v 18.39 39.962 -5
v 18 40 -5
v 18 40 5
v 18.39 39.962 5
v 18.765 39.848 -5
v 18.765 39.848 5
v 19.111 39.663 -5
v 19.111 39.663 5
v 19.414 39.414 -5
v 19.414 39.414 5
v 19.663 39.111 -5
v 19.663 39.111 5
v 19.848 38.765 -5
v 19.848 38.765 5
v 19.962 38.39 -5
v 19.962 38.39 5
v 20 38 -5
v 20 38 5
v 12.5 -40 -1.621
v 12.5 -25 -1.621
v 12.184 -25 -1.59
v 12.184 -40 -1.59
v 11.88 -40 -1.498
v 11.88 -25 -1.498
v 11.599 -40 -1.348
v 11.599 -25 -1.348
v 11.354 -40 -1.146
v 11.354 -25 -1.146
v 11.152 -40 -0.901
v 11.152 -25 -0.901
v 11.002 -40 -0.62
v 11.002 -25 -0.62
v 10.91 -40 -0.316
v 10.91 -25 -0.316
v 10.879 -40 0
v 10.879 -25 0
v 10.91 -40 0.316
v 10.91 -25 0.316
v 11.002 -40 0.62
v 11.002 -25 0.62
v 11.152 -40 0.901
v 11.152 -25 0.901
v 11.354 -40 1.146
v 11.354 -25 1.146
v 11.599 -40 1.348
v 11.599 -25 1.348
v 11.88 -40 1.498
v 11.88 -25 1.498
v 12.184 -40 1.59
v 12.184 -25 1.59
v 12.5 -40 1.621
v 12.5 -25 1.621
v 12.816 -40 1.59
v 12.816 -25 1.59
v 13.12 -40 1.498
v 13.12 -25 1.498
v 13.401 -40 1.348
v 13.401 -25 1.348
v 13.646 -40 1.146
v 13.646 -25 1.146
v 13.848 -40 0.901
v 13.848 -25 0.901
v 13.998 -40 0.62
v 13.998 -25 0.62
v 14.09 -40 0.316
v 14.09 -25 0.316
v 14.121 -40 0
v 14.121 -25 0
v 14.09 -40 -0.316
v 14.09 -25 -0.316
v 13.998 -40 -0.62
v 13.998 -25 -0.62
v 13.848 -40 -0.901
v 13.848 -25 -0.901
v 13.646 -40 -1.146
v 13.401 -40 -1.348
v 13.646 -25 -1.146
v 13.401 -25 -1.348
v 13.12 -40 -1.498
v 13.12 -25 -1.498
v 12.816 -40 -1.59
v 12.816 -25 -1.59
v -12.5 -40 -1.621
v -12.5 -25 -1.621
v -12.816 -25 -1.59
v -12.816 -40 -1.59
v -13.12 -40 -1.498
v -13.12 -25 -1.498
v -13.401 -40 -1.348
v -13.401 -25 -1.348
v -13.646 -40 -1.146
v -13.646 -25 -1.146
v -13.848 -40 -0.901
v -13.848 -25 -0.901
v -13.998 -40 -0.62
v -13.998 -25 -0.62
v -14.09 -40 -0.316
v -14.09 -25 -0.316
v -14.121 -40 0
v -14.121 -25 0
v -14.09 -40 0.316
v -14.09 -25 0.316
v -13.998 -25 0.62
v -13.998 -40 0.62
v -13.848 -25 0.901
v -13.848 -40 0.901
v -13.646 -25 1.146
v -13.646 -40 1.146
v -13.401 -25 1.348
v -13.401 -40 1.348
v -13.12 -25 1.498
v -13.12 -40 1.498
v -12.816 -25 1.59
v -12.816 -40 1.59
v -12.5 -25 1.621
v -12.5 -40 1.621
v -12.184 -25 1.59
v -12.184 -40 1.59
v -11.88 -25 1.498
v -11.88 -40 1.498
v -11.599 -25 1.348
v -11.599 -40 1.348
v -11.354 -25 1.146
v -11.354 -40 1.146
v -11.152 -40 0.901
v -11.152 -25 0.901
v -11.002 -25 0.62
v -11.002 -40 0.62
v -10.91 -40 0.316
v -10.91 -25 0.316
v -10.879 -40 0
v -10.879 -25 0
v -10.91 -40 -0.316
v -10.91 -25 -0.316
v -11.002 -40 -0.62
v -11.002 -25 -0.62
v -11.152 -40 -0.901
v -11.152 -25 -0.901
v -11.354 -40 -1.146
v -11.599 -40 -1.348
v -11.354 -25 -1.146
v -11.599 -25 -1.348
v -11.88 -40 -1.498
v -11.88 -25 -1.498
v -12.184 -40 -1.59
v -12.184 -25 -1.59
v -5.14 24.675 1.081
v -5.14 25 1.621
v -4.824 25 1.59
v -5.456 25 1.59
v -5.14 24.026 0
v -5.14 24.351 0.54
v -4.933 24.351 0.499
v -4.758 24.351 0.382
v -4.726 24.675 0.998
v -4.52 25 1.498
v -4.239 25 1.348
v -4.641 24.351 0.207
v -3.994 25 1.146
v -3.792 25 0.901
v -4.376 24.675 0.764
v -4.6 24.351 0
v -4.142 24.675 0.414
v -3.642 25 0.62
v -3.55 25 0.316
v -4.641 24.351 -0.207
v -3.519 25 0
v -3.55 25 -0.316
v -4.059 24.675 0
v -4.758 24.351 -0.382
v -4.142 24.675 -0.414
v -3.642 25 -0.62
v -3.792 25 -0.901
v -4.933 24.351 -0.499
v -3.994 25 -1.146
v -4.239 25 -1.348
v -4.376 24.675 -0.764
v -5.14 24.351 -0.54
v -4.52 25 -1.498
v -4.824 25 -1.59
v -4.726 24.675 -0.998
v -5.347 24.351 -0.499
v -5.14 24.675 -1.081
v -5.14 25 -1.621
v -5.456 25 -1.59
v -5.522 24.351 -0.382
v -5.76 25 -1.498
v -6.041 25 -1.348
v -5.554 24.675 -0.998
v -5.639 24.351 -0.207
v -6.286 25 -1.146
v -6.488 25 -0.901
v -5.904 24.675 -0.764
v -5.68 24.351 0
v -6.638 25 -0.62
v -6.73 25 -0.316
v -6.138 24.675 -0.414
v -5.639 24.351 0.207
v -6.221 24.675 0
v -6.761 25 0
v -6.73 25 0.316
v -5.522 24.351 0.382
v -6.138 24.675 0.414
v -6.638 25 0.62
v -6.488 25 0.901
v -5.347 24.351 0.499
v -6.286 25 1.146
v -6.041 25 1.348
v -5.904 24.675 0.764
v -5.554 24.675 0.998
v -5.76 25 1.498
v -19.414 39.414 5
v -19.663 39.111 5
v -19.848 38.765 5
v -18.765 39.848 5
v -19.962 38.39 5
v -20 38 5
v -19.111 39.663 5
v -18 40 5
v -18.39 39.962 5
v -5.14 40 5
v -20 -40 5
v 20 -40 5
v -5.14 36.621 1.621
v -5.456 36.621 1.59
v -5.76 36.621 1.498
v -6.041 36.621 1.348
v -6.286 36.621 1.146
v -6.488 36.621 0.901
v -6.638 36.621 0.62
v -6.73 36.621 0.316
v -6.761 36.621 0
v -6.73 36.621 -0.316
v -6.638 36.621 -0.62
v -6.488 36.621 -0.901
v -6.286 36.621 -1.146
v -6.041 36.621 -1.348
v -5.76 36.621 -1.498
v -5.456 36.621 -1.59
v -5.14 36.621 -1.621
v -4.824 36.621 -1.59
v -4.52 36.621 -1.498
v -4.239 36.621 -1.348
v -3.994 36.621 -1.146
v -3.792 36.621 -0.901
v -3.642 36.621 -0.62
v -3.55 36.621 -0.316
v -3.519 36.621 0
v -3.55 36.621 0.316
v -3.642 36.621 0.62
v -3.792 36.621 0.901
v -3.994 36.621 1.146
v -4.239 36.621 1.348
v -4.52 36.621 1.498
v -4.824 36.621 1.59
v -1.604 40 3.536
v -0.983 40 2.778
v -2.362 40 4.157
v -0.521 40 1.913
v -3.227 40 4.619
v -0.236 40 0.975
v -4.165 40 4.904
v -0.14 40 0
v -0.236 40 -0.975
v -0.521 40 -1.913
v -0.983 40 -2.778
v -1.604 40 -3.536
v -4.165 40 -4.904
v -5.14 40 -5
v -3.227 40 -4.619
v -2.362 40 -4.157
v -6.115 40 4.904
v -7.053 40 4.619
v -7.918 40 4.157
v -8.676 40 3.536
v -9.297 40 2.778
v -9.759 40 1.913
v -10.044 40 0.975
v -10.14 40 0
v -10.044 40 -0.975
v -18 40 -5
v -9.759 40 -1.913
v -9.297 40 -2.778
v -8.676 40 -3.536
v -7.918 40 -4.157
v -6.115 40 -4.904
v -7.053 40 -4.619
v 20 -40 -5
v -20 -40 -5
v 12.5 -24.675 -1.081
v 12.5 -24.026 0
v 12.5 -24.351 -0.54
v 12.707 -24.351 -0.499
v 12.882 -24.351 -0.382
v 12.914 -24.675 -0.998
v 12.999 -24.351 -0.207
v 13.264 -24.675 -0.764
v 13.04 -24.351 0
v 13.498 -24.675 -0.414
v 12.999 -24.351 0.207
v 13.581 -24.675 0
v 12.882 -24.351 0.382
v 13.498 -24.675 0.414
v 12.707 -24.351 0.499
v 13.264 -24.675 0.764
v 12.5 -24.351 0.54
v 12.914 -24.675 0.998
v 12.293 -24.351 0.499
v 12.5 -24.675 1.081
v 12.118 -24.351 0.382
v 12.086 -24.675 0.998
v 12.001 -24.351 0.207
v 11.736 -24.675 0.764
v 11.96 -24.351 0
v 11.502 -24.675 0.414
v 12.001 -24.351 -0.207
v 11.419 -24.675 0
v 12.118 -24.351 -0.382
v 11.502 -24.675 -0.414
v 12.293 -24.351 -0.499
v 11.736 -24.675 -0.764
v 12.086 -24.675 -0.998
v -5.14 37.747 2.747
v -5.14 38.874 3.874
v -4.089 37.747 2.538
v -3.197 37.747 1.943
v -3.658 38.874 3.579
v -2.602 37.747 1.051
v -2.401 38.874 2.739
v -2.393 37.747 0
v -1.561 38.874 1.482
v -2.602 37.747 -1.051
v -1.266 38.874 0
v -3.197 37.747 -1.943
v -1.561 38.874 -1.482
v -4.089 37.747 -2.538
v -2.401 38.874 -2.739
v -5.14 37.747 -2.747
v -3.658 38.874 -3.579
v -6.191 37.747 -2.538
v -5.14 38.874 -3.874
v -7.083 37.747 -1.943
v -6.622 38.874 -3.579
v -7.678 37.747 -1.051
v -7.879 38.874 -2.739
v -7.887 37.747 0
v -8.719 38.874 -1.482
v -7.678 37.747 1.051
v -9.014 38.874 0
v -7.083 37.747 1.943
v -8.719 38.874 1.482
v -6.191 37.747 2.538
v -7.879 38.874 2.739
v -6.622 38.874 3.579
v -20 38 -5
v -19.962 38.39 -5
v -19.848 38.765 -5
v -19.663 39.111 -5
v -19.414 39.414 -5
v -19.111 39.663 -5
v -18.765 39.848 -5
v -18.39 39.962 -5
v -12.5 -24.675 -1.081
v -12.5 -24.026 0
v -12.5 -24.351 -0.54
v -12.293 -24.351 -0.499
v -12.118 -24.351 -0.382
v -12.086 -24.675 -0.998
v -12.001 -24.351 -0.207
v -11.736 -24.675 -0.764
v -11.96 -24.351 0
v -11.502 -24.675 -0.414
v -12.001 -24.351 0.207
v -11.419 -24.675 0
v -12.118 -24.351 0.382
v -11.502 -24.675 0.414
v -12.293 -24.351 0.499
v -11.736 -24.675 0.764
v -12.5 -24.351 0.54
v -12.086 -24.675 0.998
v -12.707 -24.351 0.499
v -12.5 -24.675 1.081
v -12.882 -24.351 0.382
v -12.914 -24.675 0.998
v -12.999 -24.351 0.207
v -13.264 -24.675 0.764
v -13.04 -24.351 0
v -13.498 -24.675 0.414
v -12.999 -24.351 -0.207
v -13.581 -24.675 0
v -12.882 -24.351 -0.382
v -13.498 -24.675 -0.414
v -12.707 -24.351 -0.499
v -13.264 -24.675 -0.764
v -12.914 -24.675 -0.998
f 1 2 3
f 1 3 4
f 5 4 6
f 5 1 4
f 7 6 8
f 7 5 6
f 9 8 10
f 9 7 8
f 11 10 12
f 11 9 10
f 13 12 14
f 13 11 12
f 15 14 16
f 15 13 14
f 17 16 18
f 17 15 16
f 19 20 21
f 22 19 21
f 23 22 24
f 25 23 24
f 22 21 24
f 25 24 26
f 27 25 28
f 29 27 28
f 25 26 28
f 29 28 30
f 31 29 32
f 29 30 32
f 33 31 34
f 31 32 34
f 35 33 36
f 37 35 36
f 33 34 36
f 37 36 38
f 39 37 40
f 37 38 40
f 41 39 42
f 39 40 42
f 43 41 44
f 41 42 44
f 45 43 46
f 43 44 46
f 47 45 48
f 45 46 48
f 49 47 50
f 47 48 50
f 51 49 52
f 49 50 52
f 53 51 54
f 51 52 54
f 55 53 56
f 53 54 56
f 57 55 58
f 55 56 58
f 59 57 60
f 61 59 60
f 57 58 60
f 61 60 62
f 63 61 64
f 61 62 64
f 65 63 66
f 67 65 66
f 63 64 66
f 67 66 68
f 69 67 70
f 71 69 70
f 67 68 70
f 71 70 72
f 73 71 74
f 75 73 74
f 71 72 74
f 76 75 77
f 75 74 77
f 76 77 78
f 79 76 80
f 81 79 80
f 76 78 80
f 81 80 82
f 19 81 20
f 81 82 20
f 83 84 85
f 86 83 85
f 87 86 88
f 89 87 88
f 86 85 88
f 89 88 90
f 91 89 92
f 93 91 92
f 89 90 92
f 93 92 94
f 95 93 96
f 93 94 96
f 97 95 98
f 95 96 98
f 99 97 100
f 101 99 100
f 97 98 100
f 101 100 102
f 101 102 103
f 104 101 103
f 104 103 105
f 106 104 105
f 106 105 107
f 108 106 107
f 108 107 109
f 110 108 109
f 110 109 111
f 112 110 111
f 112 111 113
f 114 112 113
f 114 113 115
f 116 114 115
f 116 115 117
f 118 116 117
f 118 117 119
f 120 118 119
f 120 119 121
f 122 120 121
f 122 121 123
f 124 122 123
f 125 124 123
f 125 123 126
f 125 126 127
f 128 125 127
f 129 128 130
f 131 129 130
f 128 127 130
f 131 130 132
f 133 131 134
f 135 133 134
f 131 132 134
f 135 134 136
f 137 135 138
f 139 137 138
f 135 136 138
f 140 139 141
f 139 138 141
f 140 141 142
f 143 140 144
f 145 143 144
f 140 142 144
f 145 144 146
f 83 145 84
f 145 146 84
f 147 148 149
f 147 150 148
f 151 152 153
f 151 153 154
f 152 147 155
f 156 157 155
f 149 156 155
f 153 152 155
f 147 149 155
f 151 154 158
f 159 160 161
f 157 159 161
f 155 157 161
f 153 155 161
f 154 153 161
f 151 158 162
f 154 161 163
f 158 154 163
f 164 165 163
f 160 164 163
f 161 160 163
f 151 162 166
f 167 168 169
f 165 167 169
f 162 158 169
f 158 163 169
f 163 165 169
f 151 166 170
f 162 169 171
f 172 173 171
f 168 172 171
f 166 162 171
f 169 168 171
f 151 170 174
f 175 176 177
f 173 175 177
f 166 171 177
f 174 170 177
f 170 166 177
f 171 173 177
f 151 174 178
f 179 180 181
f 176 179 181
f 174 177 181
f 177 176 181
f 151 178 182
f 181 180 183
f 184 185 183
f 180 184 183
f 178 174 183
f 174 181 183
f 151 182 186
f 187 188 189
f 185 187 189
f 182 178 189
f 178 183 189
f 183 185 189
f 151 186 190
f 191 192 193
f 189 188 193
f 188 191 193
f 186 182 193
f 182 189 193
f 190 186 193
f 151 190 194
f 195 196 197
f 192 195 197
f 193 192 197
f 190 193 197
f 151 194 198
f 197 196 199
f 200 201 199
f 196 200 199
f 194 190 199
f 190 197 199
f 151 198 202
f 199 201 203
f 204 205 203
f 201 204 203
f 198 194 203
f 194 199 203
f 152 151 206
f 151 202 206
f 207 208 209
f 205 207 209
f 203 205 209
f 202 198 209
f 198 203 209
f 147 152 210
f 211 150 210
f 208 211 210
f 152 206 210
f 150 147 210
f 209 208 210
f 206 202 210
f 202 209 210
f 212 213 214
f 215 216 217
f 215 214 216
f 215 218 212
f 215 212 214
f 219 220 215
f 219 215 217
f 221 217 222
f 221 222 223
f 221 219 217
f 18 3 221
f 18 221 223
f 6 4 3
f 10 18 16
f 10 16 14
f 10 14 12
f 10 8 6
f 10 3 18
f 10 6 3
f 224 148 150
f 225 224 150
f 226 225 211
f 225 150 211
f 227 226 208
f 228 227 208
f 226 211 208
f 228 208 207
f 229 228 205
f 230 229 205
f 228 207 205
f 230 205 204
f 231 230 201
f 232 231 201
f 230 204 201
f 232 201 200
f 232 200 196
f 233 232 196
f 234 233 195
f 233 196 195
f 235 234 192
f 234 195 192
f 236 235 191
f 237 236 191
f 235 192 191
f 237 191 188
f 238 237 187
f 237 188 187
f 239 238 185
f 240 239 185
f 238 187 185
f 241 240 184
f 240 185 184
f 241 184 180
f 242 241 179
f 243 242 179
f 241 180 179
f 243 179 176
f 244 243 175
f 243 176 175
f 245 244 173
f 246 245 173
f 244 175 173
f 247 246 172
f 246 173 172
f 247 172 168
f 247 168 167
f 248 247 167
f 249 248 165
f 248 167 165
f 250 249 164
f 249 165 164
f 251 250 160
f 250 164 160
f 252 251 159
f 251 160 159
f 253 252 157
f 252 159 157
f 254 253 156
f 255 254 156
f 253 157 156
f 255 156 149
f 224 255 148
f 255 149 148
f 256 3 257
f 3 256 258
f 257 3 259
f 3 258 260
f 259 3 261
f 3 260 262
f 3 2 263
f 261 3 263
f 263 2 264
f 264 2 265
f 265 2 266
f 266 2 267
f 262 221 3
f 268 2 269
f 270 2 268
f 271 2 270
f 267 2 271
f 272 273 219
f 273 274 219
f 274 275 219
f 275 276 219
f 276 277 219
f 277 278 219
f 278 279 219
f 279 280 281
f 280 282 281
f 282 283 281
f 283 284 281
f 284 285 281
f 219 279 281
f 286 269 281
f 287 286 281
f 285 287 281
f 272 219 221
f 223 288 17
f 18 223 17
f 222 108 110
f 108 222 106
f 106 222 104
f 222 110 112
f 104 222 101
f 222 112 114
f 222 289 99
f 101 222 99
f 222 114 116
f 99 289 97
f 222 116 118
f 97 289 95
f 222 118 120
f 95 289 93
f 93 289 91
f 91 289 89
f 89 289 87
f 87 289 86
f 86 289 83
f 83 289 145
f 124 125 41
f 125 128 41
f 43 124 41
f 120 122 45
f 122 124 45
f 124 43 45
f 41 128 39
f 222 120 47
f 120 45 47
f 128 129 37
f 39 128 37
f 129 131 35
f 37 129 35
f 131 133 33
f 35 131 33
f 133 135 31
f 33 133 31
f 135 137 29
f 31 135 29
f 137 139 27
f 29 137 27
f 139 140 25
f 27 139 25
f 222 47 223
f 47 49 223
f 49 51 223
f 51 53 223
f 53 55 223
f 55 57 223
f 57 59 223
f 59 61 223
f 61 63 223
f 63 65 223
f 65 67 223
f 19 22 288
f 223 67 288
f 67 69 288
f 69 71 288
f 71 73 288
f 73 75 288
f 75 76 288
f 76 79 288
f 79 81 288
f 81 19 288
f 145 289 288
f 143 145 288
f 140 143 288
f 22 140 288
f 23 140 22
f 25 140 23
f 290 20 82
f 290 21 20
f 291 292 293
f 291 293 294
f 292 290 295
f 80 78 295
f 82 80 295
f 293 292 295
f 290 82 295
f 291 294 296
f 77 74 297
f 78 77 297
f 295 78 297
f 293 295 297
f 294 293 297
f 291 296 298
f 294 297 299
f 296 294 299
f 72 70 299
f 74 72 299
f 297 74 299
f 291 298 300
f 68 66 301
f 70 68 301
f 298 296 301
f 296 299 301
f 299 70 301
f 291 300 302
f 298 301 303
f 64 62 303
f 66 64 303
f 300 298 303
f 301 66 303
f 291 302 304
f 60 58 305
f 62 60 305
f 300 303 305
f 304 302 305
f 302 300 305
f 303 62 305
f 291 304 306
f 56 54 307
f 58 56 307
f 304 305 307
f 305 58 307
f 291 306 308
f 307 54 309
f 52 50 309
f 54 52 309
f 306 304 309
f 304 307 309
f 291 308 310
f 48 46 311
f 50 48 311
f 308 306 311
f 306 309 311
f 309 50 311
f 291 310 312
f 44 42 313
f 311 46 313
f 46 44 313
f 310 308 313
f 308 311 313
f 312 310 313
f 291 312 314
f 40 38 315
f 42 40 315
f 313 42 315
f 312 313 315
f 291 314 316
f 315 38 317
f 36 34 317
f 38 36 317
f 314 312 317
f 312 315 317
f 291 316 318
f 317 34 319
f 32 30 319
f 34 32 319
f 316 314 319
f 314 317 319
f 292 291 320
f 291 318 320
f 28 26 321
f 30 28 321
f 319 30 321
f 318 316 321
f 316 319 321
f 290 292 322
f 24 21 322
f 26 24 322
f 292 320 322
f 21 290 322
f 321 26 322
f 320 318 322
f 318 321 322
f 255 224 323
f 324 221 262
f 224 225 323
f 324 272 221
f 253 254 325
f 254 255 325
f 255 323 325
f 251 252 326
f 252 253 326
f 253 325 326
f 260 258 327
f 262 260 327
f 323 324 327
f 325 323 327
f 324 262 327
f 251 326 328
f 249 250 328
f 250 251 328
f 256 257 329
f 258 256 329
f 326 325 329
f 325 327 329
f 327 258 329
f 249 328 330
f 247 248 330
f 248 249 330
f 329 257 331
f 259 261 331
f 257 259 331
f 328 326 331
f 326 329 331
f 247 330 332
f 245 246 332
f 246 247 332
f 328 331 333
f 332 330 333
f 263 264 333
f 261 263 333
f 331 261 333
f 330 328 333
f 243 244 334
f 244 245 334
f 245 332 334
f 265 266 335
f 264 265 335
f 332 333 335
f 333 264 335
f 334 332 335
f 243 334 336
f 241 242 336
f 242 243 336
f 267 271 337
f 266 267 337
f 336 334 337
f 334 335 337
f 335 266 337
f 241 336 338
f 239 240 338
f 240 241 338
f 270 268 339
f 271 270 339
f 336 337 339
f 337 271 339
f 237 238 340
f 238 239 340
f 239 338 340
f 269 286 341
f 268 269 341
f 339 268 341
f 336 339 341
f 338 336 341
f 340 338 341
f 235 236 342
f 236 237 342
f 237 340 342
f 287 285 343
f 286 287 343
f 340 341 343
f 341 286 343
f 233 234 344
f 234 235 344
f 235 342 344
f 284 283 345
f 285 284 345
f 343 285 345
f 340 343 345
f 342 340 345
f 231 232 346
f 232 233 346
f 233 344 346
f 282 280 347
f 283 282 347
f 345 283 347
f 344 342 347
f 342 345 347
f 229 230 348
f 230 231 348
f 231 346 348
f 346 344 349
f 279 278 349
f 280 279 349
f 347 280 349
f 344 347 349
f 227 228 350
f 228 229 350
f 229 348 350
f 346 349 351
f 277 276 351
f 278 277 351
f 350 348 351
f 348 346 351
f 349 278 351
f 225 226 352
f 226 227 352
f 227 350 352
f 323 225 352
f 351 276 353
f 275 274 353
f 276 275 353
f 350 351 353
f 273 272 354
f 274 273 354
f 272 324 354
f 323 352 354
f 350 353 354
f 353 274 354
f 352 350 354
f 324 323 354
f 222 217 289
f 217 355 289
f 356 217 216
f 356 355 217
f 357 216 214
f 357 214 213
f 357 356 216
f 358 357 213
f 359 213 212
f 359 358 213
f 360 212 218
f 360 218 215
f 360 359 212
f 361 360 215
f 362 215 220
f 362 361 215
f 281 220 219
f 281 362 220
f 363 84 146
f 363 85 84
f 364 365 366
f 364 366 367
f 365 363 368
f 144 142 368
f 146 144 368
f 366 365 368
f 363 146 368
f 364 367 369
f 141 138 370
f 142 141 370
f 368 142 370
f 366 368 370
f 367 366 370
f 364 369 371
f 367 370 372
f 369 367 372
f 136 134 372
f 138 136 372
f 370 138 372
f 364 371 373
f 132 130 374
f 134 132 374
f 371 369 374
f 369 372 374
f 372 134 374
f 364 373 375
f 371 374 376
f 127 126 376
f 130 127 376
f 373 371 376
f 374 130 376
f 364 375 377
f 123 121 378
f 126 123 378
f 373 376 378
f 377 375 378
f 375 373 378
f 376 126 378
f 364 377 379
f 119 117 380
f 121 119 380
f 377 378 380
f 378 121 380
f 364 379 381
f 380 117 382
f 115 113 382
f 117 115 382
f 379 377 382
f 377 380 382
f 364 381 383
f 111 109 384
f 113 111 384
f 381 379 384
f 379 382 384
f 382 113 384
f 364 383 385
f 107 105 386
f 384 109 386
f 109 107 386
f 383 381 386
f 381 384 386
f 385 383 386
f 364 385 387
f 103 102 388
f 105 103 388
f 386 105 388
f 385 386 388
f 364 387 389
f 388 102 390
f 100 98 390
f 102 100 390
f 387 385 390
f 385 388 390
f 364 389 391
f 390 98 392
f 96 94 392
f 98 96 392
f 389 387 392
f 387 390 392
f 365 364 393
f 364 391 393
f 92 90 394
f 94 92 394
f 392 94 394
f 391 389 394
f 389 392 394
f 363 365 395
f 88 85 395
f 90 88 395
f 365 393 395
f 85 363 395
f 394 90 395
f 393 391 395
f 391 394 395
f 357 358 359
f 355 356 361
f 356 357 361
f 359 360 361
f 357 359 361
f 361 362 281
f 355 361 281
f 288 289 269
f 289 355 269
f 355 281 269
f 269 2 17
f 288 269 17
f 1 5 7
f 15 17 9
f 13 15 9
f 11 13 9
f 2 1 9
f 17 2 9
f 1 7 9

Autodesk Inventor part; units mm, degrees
ref_plane "YZ Plane" through (0, 0, 0) normal (1, 0, 0) x (0, 1, 0)
ref_plane "XZ Plane" through (0, 0, 0) normal (0, 1, 0) x (-1, 0, 0)
ref_plane "XY Plane" through (0, 0, 0) normal (0, 0, 1) x (1, 0, 0)
sketch "Esboço1" plane through (0, 0, 0) normal (0, 0, 1) x (1, 0, 0)
  line L0 (-20, -40) -> (20, -40)
  line L1 (20, -40) -> (20, 40)
  line L2 (20, 40) -> (-20, 40)
  line L3 (-20, 40) -> (-20, -40)
  line L4 (-20, 40) -> (20, 40)
  circle A0 centre (0, 30) radius 5 construction
  circle A1 centre (0, 30) radius 28 construction
  circle A2 centre (0, 30) radius 74 construction
  line L5 (-20, 10.4041) -> (20, 10.4041) construction
  line L6 (-20, -44) -> (20, -44) construction
  line L7 (-103.6, 0) -> (103.6, 0) construction
  line L8 (0, -73.6) -> (0, 133.6) construction
  line L9 (-20, 16.906) -> (20, 40)
  point P0 (0, 0)
  dimension "d0" = 80
  dimension "d1" = 40
  dimension "d41" = 10
  dimension "d42" = 70
  dimension "d43" = 56
  dimension "d45" = 84
  dimension "d49" = 30
  dimension "d58" = 10
extrude "Extrusão1" add sketch "Esboço1" along normal mid plane 10
extrude "Extrusão4" [suppressed]
sketch "Esboço2" plane through (-20, -40, -5) normal (0, -1, 0) x (1, 0, 0)
  line L0 (40, 10) -> (40, 0)
  line L1 (40, 5) -> (0, 5) construction
  line L2 (0, 0) -> (0, 10)
  line L3 (0, 0) -> (0, 10) projected
  line L4 (40, 0) -> (40, 10) projected
  line L5 (0, 10) -> (40, 10) construction
  line L6 (20, 10) -> (20, 0) construction
  line L7 (40, 0) -> (0, 0) construction
  point P0 (20, 5)
  point P1 (7.5, 5)
  point P2 (32.5, 5)
  dimension "d9" = 7.5
  dimension "d10" = 7.5
  dimension "d37" = 25
hole "Furo1" at (-12.5, -40, 0) at (12.5, -40, 0) direction (0, 1, 0) diameter 3.242 depth 15 tip angle 118 thread size "M4x0.7" class "6H" standard "ISO Metric profile"
sketch "Esboço3" plane through (0, 0, 5) normal (0, 0, 1) x (1, 0, 0)
  point P0 (0, 0)
  point P1 (0, 37.5)
  point P2 (0, 30)
hole "Furo2" [suppressed]
sketch "Esboço6" plane through (20, 40, 5) normal (-0.5, 0.8660254, 0) x (0.8660254, 0.5, 0)
  line L0 (0, 0) -> (0, 10) construction
  line L1 (0, 5) -> (-46.188, 5) construction
  line L2 (-46.188, 0) -> (-46.188, 10) construction
  line L3 (-23.094, 5) -> (-23.094, 0) construction
  point P0 (-37.3205, 5)
  point P1 (-33.094, 5)
  point P2 (-13.094, 5)
  dimension "d50" = 20
hole "Furo3" [suppressed]
sketch "Esboço7" plane through (-20, 40, 5) normal (0, 1, 0) x (1, 0, 0)
  line L0 (-8, 5) -> (48, 5) construction
  line L1 (20, 12) -> (20, -2) construction
  line L2 (0, 10) -> (0, 0) projected
  point P0 (20, 5)
  point P1 (14.86, 5)
  dimension "d59" = 14.86
hole "Furo4" at (-5.14, 40, 0) direction (0, -1, 0) diameter 3.242 depth 15 tip angle 118 countersink diameter 10 countersink angle 90 thread size "M4x0.7" class "6H" standard "ISO Metric profile"
fillet "Arredondamento3" radius 2 2 edges at (20, 40, 0) (-20, 40, 0)
properties part number "GRJ-03-116B" material "Fenolite OR"
